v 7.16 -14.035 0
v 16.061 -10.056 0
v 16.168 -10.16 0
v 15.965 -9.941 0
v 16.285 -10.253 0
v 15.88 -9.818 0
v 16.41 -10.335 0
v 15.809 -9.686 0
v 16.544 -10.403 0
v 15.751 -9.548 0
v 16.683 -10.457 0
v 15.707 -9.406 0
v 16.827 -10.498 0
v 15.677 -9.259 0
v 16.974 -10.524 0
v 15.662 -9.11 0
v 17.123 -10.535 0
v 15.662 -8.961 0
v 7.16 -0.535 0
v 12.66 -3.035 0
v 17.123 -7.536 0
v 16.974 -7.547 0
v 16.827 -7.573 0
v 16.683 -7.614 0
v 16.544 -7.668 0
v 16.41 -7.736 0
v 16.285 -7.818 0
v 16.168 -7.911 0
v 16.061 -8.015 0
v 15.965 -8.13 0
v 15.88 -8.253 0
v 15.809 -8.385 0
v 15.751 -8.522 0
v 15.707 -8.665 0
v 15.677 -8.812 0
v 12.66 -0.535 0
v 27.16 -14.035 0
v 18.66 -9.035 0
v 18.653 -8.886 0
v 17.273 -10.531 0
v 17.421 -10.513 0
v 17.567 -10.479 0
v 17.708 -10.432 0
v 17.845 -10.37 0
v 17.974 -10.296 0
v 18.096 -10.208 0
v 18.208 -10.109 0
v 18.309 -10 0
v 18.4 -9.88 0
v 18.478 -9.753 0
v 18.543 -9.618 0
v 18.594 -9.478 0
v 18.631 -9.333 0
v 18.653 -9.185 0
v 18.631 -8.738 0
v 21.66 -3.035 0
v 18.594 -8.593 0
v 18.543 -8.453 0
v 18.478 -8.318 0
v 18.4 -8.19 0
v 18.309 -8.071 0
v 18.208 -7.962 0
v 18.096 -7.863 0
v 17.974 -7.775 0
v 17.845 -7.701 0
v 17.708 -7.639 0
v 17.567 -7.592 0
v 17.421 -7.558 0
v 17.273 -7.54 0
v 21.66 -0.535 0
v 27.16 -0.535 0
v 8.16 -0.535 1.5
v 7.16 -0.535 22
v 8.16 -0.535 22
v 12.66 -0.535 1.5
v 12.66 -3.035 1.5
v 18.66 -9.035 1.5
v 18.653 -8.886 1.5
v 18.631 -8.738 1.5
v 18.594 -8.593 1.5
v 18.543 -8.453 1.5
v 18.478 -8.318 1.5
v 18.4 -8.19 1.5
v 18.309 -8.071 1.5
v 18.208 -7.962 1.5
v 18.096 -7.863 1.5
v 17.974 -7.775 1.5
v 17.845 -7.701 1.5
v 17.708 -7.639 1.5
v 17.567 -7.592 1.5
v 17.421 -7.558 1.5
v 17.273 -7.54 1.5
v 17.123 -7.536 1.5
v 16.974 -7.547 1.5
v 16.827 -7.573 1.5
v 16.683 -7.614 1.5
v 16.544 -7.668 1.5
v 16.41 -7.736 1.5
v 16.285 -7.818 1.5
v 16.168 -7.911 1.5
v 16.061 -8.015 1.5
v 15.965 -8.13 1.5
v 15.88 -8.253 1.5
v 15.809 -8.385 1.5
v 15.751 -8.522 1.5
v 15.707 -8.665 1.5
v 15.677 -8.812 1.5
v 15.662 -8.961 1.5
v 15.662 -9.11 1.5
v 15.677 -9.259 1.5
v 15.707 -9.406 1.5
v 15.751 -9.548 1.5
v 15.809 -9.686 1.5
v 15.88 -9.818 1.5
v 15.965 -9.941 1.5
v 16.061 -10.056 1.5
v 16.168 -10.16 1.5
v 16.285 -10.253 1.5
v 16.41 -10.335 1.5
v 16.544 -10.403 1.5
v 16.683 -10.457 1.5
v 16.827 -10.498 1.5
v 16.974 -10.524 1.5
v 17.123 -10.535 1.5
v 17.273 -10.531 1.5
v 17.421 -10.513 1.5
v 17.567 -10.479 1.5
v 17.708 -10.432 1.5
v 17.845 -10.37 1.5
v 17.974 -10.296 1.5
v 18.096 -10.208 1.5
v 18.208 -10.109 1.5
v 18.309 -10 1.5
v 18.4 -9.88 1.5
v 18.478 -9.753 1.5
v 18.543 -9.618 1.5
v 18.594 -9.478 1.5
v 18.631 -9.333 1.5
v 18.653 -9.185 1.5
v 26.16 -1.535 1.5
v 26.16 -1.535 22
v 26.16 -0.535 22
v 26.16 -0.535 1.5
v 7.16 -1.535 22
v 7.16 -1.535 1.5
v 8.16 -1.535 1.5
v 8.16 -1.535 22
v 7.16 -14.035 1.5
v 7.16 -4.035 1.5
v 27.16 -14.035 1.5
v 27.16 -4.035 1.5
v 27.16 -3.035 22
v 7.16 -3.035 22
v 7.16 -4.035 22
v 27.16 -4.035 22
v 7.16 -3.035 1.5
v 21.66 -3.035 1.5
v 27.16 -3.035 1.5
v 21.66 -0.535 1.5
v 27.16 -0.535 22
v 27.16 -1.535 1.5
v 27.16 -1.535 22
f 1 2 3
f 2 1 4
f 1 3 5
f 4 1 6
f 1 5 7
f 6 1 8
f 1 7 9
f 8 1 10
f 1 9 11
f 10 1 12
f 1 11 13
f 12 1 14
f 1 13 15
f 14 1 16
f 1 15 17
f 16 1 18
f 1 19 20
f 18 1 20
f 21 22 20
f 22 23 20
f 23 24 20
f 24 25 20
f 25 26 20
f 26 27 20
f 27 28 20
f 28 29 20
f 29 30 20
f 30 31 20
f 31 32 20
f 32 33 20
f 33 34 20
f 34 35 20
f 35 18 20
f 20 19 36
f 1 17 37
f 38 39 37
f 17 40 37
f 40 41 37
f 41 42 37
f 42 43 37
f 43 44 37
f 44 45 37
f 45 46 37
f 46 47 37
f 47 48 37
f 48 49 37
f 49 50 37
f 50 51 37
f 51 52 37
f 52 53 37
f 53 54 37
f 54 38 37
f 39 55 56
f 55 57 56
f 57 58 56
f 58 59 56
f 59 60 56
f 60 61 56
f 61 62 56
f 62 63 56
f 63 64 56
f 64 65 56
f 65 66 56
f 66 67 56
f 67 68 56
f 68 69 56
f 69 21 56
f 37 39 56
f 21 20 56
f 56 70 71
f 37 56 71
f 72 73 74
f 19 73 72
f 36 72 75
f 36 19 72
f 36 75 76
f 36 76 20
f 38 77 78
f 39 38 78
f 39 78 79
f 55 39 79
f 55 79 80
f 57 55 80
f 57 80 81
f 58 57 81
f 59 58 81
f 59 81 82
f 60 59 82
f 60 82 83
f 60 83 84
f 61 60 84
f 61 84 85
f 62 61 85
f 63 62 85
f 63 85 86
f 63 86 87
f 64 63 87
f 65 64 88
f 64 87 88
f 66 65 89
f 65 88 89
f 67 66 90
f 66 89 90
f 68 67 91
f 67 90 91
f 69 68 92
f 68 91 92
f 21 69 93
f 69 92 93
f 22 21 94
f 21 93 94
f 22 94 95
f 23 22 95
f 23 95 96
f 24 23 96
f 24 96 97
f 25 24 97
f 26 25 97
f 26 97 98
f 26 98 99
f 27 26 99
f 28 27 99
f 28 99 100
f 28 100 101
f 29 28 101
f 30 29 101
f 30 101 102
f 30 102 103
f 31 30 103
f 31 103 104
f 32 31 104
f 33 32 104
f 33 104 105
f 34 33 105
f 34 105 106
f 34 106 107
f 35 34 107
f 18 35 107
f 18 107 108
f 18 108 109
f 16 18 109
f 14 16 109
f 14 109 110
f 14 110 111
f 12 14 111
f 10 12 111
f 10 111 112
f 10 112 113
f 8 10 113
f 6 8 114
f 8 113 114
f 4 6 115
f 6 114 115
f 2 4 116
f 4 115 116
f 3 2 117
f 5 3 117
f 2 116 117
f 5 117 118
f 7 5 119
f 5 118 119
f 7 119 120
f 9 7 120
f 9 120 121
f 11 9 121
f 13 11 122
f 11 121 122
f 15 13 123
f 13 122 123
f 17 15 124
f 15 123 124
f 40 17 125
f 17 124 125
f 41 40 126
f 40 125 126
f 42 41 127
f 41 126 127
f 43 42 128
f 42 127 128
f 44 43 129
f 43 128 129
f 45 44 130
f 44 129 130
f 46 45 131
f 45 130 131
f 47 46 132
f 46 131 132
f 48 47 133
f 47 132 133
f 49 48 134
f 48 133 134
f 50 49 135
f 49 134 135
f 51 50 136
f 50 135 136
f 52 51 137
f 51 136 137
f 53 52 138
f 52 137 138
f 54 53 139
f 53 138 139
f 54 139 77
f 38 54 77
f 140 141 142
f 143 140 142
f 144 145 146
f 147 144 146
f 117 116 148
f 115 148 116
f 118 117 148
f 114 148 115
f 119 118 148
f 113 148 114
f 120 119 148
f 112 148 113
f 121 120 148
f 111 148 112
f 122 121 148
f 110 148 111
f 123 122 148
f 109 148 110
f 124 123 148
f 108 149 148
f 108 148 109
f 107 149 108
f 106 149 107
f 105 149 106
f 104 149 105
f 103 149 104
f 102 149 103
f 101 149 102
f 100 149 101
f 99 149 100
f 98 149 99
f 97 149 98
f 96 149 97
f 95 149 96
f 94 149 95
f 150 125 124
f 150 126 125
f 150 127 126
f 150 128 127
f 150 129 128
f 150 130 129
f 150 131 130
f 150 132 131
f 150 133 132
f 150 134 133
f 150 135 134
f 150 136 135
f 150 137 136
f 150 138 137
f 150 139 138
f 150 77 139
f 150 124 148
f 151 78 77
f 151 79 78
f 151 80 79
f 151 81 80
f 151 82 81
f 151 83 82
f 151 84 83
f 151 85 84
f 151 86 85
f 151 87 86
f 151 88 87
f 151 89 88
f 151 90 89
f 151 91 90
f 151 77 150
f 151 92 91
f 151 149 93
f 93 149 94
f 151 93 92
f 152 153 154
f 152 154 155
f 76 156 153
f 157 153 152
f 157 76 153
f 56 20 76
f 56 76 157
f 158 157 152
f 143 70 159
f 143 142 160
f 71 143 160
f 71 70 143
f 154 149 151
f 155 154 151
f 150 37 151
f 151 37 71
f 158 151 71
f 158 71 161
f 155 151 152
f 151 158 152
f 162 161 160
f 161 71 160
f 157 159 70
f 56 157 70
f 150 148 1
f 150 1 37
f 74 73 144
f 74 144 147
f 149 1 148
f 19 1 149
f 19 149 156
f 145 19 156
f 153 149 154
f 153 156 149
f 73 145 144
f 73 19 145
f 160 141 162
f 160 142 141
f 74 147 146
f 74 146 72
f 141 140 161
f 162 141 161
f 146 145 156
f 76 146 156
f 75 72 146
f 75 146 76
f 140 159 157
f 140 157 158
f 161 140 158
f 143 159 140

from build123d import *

# Parameters (mm, degrees)
ESBO_O1_W                = 20
ESBO_O1_H                = 3.5
RESSALTO_EXTRUS_O1_DEPTH = 22
ESBO_O2_W                = 18
ESBO_O2_H                = 3.80087929
CORTE_EXTRUS_O1_DEPTH    = 20.5
ESBO_O3_W                = 1
ESBO_O3_H                = 20.5
CORTE_EXTRUS_O2_DEPTH    = 1.5
ESBO_O4_W                = 20
ESBO_O4_H                = 1.5
RESSALTO_EXTRUS_O2_DEPTH = 10
ESBO_O5_R                = 1.5
CORTE_EXTRUS_O3_DEPTH    = 7
ESBO_O6_W                = 9
ESBO_O6_H                = 3.518504599
CORTE_EXTRUS_O4_DEPTH    = 2.5


with BuildPart() as part:
    # Esboço1 → Ressalto-extrusão1 (new body)
    with BuildSketch(Plane.XY):
        with Locations((17.16043247, -2.285464773)):
            Rectangle(ESBO_O1_W, ESBO_O1_H)
    extrude(amount=RESSALTO_EXTRUS_O1_DEPTH)

    # Esboço2 → Corte-extrusão1 (cut)
    with BuildSketch(Plane.XY.offset(22)):
        with Locations((17.16043247, -1.135025128)):
            Rectangle(ESBO_O2_W, ESBO_O2_H)
    extrude(amount=-CORTE_EXTRUS_O1_DEPTH, mode=Mode.SUBTRACT)

    # Esboço3 → Corte-extrusão2 (cut)
    with BuildSketch(Plane(origin=(0, -1.535464773, 0), x_dir=(1, 0, 0), z_dir=(0, 1, 0))):
        with Locations((7.66043247, -11.75)):
            Rectangle(ESBO_O3_W, ESBO_O3_H)
        with Locations((26.66043247, -11.75)):
            Rectangle(ESBO_O3_W, ESBO_O3_H)
    extrude(amount=-CORTE_EXTRUS_O2_DEPTH, mode=Mode.SUBTRACT)

    # Esboço4 → Ressalto-extrusão2 (add)
    with BuildSketch(Plane.XZ.offset(4.035464773)):
        with Locations((17.16043247, 0.75)):
            Rectangle(ESBO_O4_W, ESBO_O4_H)
    extrude(amount=RESSALTO_EXTRUS_O2_DEPTH)

    # Esboço5 → Corte-extrusão3 (cut)
    with BuildSketch(Plane.XY.offset(1.5)):
        with Locations((17.16043247, -9.035464773)):
            Circle(ESBO_O5_R)
    extrude(amount=-CORTE_EXTRUS_O3_DEPTH, mode=Mode.SUBTRACT)

    # Esboço6 → Corte-extrusão4 (cut)
    with BuildSketch(Plane(origin=(0, -0.535464773, 0), x_dir=(1, 0, 0), z_dir=(0, 1, 0))):
        with Locations((17.16043247, -0.984028815)):
            Rectangle(ESBO_O6_W, ESBO_O6_H)
    extrude(amount=-CORTE_EXTRUS_O4_DEPTH, mode=Mode.SUBTRACT)


solid = part.part
